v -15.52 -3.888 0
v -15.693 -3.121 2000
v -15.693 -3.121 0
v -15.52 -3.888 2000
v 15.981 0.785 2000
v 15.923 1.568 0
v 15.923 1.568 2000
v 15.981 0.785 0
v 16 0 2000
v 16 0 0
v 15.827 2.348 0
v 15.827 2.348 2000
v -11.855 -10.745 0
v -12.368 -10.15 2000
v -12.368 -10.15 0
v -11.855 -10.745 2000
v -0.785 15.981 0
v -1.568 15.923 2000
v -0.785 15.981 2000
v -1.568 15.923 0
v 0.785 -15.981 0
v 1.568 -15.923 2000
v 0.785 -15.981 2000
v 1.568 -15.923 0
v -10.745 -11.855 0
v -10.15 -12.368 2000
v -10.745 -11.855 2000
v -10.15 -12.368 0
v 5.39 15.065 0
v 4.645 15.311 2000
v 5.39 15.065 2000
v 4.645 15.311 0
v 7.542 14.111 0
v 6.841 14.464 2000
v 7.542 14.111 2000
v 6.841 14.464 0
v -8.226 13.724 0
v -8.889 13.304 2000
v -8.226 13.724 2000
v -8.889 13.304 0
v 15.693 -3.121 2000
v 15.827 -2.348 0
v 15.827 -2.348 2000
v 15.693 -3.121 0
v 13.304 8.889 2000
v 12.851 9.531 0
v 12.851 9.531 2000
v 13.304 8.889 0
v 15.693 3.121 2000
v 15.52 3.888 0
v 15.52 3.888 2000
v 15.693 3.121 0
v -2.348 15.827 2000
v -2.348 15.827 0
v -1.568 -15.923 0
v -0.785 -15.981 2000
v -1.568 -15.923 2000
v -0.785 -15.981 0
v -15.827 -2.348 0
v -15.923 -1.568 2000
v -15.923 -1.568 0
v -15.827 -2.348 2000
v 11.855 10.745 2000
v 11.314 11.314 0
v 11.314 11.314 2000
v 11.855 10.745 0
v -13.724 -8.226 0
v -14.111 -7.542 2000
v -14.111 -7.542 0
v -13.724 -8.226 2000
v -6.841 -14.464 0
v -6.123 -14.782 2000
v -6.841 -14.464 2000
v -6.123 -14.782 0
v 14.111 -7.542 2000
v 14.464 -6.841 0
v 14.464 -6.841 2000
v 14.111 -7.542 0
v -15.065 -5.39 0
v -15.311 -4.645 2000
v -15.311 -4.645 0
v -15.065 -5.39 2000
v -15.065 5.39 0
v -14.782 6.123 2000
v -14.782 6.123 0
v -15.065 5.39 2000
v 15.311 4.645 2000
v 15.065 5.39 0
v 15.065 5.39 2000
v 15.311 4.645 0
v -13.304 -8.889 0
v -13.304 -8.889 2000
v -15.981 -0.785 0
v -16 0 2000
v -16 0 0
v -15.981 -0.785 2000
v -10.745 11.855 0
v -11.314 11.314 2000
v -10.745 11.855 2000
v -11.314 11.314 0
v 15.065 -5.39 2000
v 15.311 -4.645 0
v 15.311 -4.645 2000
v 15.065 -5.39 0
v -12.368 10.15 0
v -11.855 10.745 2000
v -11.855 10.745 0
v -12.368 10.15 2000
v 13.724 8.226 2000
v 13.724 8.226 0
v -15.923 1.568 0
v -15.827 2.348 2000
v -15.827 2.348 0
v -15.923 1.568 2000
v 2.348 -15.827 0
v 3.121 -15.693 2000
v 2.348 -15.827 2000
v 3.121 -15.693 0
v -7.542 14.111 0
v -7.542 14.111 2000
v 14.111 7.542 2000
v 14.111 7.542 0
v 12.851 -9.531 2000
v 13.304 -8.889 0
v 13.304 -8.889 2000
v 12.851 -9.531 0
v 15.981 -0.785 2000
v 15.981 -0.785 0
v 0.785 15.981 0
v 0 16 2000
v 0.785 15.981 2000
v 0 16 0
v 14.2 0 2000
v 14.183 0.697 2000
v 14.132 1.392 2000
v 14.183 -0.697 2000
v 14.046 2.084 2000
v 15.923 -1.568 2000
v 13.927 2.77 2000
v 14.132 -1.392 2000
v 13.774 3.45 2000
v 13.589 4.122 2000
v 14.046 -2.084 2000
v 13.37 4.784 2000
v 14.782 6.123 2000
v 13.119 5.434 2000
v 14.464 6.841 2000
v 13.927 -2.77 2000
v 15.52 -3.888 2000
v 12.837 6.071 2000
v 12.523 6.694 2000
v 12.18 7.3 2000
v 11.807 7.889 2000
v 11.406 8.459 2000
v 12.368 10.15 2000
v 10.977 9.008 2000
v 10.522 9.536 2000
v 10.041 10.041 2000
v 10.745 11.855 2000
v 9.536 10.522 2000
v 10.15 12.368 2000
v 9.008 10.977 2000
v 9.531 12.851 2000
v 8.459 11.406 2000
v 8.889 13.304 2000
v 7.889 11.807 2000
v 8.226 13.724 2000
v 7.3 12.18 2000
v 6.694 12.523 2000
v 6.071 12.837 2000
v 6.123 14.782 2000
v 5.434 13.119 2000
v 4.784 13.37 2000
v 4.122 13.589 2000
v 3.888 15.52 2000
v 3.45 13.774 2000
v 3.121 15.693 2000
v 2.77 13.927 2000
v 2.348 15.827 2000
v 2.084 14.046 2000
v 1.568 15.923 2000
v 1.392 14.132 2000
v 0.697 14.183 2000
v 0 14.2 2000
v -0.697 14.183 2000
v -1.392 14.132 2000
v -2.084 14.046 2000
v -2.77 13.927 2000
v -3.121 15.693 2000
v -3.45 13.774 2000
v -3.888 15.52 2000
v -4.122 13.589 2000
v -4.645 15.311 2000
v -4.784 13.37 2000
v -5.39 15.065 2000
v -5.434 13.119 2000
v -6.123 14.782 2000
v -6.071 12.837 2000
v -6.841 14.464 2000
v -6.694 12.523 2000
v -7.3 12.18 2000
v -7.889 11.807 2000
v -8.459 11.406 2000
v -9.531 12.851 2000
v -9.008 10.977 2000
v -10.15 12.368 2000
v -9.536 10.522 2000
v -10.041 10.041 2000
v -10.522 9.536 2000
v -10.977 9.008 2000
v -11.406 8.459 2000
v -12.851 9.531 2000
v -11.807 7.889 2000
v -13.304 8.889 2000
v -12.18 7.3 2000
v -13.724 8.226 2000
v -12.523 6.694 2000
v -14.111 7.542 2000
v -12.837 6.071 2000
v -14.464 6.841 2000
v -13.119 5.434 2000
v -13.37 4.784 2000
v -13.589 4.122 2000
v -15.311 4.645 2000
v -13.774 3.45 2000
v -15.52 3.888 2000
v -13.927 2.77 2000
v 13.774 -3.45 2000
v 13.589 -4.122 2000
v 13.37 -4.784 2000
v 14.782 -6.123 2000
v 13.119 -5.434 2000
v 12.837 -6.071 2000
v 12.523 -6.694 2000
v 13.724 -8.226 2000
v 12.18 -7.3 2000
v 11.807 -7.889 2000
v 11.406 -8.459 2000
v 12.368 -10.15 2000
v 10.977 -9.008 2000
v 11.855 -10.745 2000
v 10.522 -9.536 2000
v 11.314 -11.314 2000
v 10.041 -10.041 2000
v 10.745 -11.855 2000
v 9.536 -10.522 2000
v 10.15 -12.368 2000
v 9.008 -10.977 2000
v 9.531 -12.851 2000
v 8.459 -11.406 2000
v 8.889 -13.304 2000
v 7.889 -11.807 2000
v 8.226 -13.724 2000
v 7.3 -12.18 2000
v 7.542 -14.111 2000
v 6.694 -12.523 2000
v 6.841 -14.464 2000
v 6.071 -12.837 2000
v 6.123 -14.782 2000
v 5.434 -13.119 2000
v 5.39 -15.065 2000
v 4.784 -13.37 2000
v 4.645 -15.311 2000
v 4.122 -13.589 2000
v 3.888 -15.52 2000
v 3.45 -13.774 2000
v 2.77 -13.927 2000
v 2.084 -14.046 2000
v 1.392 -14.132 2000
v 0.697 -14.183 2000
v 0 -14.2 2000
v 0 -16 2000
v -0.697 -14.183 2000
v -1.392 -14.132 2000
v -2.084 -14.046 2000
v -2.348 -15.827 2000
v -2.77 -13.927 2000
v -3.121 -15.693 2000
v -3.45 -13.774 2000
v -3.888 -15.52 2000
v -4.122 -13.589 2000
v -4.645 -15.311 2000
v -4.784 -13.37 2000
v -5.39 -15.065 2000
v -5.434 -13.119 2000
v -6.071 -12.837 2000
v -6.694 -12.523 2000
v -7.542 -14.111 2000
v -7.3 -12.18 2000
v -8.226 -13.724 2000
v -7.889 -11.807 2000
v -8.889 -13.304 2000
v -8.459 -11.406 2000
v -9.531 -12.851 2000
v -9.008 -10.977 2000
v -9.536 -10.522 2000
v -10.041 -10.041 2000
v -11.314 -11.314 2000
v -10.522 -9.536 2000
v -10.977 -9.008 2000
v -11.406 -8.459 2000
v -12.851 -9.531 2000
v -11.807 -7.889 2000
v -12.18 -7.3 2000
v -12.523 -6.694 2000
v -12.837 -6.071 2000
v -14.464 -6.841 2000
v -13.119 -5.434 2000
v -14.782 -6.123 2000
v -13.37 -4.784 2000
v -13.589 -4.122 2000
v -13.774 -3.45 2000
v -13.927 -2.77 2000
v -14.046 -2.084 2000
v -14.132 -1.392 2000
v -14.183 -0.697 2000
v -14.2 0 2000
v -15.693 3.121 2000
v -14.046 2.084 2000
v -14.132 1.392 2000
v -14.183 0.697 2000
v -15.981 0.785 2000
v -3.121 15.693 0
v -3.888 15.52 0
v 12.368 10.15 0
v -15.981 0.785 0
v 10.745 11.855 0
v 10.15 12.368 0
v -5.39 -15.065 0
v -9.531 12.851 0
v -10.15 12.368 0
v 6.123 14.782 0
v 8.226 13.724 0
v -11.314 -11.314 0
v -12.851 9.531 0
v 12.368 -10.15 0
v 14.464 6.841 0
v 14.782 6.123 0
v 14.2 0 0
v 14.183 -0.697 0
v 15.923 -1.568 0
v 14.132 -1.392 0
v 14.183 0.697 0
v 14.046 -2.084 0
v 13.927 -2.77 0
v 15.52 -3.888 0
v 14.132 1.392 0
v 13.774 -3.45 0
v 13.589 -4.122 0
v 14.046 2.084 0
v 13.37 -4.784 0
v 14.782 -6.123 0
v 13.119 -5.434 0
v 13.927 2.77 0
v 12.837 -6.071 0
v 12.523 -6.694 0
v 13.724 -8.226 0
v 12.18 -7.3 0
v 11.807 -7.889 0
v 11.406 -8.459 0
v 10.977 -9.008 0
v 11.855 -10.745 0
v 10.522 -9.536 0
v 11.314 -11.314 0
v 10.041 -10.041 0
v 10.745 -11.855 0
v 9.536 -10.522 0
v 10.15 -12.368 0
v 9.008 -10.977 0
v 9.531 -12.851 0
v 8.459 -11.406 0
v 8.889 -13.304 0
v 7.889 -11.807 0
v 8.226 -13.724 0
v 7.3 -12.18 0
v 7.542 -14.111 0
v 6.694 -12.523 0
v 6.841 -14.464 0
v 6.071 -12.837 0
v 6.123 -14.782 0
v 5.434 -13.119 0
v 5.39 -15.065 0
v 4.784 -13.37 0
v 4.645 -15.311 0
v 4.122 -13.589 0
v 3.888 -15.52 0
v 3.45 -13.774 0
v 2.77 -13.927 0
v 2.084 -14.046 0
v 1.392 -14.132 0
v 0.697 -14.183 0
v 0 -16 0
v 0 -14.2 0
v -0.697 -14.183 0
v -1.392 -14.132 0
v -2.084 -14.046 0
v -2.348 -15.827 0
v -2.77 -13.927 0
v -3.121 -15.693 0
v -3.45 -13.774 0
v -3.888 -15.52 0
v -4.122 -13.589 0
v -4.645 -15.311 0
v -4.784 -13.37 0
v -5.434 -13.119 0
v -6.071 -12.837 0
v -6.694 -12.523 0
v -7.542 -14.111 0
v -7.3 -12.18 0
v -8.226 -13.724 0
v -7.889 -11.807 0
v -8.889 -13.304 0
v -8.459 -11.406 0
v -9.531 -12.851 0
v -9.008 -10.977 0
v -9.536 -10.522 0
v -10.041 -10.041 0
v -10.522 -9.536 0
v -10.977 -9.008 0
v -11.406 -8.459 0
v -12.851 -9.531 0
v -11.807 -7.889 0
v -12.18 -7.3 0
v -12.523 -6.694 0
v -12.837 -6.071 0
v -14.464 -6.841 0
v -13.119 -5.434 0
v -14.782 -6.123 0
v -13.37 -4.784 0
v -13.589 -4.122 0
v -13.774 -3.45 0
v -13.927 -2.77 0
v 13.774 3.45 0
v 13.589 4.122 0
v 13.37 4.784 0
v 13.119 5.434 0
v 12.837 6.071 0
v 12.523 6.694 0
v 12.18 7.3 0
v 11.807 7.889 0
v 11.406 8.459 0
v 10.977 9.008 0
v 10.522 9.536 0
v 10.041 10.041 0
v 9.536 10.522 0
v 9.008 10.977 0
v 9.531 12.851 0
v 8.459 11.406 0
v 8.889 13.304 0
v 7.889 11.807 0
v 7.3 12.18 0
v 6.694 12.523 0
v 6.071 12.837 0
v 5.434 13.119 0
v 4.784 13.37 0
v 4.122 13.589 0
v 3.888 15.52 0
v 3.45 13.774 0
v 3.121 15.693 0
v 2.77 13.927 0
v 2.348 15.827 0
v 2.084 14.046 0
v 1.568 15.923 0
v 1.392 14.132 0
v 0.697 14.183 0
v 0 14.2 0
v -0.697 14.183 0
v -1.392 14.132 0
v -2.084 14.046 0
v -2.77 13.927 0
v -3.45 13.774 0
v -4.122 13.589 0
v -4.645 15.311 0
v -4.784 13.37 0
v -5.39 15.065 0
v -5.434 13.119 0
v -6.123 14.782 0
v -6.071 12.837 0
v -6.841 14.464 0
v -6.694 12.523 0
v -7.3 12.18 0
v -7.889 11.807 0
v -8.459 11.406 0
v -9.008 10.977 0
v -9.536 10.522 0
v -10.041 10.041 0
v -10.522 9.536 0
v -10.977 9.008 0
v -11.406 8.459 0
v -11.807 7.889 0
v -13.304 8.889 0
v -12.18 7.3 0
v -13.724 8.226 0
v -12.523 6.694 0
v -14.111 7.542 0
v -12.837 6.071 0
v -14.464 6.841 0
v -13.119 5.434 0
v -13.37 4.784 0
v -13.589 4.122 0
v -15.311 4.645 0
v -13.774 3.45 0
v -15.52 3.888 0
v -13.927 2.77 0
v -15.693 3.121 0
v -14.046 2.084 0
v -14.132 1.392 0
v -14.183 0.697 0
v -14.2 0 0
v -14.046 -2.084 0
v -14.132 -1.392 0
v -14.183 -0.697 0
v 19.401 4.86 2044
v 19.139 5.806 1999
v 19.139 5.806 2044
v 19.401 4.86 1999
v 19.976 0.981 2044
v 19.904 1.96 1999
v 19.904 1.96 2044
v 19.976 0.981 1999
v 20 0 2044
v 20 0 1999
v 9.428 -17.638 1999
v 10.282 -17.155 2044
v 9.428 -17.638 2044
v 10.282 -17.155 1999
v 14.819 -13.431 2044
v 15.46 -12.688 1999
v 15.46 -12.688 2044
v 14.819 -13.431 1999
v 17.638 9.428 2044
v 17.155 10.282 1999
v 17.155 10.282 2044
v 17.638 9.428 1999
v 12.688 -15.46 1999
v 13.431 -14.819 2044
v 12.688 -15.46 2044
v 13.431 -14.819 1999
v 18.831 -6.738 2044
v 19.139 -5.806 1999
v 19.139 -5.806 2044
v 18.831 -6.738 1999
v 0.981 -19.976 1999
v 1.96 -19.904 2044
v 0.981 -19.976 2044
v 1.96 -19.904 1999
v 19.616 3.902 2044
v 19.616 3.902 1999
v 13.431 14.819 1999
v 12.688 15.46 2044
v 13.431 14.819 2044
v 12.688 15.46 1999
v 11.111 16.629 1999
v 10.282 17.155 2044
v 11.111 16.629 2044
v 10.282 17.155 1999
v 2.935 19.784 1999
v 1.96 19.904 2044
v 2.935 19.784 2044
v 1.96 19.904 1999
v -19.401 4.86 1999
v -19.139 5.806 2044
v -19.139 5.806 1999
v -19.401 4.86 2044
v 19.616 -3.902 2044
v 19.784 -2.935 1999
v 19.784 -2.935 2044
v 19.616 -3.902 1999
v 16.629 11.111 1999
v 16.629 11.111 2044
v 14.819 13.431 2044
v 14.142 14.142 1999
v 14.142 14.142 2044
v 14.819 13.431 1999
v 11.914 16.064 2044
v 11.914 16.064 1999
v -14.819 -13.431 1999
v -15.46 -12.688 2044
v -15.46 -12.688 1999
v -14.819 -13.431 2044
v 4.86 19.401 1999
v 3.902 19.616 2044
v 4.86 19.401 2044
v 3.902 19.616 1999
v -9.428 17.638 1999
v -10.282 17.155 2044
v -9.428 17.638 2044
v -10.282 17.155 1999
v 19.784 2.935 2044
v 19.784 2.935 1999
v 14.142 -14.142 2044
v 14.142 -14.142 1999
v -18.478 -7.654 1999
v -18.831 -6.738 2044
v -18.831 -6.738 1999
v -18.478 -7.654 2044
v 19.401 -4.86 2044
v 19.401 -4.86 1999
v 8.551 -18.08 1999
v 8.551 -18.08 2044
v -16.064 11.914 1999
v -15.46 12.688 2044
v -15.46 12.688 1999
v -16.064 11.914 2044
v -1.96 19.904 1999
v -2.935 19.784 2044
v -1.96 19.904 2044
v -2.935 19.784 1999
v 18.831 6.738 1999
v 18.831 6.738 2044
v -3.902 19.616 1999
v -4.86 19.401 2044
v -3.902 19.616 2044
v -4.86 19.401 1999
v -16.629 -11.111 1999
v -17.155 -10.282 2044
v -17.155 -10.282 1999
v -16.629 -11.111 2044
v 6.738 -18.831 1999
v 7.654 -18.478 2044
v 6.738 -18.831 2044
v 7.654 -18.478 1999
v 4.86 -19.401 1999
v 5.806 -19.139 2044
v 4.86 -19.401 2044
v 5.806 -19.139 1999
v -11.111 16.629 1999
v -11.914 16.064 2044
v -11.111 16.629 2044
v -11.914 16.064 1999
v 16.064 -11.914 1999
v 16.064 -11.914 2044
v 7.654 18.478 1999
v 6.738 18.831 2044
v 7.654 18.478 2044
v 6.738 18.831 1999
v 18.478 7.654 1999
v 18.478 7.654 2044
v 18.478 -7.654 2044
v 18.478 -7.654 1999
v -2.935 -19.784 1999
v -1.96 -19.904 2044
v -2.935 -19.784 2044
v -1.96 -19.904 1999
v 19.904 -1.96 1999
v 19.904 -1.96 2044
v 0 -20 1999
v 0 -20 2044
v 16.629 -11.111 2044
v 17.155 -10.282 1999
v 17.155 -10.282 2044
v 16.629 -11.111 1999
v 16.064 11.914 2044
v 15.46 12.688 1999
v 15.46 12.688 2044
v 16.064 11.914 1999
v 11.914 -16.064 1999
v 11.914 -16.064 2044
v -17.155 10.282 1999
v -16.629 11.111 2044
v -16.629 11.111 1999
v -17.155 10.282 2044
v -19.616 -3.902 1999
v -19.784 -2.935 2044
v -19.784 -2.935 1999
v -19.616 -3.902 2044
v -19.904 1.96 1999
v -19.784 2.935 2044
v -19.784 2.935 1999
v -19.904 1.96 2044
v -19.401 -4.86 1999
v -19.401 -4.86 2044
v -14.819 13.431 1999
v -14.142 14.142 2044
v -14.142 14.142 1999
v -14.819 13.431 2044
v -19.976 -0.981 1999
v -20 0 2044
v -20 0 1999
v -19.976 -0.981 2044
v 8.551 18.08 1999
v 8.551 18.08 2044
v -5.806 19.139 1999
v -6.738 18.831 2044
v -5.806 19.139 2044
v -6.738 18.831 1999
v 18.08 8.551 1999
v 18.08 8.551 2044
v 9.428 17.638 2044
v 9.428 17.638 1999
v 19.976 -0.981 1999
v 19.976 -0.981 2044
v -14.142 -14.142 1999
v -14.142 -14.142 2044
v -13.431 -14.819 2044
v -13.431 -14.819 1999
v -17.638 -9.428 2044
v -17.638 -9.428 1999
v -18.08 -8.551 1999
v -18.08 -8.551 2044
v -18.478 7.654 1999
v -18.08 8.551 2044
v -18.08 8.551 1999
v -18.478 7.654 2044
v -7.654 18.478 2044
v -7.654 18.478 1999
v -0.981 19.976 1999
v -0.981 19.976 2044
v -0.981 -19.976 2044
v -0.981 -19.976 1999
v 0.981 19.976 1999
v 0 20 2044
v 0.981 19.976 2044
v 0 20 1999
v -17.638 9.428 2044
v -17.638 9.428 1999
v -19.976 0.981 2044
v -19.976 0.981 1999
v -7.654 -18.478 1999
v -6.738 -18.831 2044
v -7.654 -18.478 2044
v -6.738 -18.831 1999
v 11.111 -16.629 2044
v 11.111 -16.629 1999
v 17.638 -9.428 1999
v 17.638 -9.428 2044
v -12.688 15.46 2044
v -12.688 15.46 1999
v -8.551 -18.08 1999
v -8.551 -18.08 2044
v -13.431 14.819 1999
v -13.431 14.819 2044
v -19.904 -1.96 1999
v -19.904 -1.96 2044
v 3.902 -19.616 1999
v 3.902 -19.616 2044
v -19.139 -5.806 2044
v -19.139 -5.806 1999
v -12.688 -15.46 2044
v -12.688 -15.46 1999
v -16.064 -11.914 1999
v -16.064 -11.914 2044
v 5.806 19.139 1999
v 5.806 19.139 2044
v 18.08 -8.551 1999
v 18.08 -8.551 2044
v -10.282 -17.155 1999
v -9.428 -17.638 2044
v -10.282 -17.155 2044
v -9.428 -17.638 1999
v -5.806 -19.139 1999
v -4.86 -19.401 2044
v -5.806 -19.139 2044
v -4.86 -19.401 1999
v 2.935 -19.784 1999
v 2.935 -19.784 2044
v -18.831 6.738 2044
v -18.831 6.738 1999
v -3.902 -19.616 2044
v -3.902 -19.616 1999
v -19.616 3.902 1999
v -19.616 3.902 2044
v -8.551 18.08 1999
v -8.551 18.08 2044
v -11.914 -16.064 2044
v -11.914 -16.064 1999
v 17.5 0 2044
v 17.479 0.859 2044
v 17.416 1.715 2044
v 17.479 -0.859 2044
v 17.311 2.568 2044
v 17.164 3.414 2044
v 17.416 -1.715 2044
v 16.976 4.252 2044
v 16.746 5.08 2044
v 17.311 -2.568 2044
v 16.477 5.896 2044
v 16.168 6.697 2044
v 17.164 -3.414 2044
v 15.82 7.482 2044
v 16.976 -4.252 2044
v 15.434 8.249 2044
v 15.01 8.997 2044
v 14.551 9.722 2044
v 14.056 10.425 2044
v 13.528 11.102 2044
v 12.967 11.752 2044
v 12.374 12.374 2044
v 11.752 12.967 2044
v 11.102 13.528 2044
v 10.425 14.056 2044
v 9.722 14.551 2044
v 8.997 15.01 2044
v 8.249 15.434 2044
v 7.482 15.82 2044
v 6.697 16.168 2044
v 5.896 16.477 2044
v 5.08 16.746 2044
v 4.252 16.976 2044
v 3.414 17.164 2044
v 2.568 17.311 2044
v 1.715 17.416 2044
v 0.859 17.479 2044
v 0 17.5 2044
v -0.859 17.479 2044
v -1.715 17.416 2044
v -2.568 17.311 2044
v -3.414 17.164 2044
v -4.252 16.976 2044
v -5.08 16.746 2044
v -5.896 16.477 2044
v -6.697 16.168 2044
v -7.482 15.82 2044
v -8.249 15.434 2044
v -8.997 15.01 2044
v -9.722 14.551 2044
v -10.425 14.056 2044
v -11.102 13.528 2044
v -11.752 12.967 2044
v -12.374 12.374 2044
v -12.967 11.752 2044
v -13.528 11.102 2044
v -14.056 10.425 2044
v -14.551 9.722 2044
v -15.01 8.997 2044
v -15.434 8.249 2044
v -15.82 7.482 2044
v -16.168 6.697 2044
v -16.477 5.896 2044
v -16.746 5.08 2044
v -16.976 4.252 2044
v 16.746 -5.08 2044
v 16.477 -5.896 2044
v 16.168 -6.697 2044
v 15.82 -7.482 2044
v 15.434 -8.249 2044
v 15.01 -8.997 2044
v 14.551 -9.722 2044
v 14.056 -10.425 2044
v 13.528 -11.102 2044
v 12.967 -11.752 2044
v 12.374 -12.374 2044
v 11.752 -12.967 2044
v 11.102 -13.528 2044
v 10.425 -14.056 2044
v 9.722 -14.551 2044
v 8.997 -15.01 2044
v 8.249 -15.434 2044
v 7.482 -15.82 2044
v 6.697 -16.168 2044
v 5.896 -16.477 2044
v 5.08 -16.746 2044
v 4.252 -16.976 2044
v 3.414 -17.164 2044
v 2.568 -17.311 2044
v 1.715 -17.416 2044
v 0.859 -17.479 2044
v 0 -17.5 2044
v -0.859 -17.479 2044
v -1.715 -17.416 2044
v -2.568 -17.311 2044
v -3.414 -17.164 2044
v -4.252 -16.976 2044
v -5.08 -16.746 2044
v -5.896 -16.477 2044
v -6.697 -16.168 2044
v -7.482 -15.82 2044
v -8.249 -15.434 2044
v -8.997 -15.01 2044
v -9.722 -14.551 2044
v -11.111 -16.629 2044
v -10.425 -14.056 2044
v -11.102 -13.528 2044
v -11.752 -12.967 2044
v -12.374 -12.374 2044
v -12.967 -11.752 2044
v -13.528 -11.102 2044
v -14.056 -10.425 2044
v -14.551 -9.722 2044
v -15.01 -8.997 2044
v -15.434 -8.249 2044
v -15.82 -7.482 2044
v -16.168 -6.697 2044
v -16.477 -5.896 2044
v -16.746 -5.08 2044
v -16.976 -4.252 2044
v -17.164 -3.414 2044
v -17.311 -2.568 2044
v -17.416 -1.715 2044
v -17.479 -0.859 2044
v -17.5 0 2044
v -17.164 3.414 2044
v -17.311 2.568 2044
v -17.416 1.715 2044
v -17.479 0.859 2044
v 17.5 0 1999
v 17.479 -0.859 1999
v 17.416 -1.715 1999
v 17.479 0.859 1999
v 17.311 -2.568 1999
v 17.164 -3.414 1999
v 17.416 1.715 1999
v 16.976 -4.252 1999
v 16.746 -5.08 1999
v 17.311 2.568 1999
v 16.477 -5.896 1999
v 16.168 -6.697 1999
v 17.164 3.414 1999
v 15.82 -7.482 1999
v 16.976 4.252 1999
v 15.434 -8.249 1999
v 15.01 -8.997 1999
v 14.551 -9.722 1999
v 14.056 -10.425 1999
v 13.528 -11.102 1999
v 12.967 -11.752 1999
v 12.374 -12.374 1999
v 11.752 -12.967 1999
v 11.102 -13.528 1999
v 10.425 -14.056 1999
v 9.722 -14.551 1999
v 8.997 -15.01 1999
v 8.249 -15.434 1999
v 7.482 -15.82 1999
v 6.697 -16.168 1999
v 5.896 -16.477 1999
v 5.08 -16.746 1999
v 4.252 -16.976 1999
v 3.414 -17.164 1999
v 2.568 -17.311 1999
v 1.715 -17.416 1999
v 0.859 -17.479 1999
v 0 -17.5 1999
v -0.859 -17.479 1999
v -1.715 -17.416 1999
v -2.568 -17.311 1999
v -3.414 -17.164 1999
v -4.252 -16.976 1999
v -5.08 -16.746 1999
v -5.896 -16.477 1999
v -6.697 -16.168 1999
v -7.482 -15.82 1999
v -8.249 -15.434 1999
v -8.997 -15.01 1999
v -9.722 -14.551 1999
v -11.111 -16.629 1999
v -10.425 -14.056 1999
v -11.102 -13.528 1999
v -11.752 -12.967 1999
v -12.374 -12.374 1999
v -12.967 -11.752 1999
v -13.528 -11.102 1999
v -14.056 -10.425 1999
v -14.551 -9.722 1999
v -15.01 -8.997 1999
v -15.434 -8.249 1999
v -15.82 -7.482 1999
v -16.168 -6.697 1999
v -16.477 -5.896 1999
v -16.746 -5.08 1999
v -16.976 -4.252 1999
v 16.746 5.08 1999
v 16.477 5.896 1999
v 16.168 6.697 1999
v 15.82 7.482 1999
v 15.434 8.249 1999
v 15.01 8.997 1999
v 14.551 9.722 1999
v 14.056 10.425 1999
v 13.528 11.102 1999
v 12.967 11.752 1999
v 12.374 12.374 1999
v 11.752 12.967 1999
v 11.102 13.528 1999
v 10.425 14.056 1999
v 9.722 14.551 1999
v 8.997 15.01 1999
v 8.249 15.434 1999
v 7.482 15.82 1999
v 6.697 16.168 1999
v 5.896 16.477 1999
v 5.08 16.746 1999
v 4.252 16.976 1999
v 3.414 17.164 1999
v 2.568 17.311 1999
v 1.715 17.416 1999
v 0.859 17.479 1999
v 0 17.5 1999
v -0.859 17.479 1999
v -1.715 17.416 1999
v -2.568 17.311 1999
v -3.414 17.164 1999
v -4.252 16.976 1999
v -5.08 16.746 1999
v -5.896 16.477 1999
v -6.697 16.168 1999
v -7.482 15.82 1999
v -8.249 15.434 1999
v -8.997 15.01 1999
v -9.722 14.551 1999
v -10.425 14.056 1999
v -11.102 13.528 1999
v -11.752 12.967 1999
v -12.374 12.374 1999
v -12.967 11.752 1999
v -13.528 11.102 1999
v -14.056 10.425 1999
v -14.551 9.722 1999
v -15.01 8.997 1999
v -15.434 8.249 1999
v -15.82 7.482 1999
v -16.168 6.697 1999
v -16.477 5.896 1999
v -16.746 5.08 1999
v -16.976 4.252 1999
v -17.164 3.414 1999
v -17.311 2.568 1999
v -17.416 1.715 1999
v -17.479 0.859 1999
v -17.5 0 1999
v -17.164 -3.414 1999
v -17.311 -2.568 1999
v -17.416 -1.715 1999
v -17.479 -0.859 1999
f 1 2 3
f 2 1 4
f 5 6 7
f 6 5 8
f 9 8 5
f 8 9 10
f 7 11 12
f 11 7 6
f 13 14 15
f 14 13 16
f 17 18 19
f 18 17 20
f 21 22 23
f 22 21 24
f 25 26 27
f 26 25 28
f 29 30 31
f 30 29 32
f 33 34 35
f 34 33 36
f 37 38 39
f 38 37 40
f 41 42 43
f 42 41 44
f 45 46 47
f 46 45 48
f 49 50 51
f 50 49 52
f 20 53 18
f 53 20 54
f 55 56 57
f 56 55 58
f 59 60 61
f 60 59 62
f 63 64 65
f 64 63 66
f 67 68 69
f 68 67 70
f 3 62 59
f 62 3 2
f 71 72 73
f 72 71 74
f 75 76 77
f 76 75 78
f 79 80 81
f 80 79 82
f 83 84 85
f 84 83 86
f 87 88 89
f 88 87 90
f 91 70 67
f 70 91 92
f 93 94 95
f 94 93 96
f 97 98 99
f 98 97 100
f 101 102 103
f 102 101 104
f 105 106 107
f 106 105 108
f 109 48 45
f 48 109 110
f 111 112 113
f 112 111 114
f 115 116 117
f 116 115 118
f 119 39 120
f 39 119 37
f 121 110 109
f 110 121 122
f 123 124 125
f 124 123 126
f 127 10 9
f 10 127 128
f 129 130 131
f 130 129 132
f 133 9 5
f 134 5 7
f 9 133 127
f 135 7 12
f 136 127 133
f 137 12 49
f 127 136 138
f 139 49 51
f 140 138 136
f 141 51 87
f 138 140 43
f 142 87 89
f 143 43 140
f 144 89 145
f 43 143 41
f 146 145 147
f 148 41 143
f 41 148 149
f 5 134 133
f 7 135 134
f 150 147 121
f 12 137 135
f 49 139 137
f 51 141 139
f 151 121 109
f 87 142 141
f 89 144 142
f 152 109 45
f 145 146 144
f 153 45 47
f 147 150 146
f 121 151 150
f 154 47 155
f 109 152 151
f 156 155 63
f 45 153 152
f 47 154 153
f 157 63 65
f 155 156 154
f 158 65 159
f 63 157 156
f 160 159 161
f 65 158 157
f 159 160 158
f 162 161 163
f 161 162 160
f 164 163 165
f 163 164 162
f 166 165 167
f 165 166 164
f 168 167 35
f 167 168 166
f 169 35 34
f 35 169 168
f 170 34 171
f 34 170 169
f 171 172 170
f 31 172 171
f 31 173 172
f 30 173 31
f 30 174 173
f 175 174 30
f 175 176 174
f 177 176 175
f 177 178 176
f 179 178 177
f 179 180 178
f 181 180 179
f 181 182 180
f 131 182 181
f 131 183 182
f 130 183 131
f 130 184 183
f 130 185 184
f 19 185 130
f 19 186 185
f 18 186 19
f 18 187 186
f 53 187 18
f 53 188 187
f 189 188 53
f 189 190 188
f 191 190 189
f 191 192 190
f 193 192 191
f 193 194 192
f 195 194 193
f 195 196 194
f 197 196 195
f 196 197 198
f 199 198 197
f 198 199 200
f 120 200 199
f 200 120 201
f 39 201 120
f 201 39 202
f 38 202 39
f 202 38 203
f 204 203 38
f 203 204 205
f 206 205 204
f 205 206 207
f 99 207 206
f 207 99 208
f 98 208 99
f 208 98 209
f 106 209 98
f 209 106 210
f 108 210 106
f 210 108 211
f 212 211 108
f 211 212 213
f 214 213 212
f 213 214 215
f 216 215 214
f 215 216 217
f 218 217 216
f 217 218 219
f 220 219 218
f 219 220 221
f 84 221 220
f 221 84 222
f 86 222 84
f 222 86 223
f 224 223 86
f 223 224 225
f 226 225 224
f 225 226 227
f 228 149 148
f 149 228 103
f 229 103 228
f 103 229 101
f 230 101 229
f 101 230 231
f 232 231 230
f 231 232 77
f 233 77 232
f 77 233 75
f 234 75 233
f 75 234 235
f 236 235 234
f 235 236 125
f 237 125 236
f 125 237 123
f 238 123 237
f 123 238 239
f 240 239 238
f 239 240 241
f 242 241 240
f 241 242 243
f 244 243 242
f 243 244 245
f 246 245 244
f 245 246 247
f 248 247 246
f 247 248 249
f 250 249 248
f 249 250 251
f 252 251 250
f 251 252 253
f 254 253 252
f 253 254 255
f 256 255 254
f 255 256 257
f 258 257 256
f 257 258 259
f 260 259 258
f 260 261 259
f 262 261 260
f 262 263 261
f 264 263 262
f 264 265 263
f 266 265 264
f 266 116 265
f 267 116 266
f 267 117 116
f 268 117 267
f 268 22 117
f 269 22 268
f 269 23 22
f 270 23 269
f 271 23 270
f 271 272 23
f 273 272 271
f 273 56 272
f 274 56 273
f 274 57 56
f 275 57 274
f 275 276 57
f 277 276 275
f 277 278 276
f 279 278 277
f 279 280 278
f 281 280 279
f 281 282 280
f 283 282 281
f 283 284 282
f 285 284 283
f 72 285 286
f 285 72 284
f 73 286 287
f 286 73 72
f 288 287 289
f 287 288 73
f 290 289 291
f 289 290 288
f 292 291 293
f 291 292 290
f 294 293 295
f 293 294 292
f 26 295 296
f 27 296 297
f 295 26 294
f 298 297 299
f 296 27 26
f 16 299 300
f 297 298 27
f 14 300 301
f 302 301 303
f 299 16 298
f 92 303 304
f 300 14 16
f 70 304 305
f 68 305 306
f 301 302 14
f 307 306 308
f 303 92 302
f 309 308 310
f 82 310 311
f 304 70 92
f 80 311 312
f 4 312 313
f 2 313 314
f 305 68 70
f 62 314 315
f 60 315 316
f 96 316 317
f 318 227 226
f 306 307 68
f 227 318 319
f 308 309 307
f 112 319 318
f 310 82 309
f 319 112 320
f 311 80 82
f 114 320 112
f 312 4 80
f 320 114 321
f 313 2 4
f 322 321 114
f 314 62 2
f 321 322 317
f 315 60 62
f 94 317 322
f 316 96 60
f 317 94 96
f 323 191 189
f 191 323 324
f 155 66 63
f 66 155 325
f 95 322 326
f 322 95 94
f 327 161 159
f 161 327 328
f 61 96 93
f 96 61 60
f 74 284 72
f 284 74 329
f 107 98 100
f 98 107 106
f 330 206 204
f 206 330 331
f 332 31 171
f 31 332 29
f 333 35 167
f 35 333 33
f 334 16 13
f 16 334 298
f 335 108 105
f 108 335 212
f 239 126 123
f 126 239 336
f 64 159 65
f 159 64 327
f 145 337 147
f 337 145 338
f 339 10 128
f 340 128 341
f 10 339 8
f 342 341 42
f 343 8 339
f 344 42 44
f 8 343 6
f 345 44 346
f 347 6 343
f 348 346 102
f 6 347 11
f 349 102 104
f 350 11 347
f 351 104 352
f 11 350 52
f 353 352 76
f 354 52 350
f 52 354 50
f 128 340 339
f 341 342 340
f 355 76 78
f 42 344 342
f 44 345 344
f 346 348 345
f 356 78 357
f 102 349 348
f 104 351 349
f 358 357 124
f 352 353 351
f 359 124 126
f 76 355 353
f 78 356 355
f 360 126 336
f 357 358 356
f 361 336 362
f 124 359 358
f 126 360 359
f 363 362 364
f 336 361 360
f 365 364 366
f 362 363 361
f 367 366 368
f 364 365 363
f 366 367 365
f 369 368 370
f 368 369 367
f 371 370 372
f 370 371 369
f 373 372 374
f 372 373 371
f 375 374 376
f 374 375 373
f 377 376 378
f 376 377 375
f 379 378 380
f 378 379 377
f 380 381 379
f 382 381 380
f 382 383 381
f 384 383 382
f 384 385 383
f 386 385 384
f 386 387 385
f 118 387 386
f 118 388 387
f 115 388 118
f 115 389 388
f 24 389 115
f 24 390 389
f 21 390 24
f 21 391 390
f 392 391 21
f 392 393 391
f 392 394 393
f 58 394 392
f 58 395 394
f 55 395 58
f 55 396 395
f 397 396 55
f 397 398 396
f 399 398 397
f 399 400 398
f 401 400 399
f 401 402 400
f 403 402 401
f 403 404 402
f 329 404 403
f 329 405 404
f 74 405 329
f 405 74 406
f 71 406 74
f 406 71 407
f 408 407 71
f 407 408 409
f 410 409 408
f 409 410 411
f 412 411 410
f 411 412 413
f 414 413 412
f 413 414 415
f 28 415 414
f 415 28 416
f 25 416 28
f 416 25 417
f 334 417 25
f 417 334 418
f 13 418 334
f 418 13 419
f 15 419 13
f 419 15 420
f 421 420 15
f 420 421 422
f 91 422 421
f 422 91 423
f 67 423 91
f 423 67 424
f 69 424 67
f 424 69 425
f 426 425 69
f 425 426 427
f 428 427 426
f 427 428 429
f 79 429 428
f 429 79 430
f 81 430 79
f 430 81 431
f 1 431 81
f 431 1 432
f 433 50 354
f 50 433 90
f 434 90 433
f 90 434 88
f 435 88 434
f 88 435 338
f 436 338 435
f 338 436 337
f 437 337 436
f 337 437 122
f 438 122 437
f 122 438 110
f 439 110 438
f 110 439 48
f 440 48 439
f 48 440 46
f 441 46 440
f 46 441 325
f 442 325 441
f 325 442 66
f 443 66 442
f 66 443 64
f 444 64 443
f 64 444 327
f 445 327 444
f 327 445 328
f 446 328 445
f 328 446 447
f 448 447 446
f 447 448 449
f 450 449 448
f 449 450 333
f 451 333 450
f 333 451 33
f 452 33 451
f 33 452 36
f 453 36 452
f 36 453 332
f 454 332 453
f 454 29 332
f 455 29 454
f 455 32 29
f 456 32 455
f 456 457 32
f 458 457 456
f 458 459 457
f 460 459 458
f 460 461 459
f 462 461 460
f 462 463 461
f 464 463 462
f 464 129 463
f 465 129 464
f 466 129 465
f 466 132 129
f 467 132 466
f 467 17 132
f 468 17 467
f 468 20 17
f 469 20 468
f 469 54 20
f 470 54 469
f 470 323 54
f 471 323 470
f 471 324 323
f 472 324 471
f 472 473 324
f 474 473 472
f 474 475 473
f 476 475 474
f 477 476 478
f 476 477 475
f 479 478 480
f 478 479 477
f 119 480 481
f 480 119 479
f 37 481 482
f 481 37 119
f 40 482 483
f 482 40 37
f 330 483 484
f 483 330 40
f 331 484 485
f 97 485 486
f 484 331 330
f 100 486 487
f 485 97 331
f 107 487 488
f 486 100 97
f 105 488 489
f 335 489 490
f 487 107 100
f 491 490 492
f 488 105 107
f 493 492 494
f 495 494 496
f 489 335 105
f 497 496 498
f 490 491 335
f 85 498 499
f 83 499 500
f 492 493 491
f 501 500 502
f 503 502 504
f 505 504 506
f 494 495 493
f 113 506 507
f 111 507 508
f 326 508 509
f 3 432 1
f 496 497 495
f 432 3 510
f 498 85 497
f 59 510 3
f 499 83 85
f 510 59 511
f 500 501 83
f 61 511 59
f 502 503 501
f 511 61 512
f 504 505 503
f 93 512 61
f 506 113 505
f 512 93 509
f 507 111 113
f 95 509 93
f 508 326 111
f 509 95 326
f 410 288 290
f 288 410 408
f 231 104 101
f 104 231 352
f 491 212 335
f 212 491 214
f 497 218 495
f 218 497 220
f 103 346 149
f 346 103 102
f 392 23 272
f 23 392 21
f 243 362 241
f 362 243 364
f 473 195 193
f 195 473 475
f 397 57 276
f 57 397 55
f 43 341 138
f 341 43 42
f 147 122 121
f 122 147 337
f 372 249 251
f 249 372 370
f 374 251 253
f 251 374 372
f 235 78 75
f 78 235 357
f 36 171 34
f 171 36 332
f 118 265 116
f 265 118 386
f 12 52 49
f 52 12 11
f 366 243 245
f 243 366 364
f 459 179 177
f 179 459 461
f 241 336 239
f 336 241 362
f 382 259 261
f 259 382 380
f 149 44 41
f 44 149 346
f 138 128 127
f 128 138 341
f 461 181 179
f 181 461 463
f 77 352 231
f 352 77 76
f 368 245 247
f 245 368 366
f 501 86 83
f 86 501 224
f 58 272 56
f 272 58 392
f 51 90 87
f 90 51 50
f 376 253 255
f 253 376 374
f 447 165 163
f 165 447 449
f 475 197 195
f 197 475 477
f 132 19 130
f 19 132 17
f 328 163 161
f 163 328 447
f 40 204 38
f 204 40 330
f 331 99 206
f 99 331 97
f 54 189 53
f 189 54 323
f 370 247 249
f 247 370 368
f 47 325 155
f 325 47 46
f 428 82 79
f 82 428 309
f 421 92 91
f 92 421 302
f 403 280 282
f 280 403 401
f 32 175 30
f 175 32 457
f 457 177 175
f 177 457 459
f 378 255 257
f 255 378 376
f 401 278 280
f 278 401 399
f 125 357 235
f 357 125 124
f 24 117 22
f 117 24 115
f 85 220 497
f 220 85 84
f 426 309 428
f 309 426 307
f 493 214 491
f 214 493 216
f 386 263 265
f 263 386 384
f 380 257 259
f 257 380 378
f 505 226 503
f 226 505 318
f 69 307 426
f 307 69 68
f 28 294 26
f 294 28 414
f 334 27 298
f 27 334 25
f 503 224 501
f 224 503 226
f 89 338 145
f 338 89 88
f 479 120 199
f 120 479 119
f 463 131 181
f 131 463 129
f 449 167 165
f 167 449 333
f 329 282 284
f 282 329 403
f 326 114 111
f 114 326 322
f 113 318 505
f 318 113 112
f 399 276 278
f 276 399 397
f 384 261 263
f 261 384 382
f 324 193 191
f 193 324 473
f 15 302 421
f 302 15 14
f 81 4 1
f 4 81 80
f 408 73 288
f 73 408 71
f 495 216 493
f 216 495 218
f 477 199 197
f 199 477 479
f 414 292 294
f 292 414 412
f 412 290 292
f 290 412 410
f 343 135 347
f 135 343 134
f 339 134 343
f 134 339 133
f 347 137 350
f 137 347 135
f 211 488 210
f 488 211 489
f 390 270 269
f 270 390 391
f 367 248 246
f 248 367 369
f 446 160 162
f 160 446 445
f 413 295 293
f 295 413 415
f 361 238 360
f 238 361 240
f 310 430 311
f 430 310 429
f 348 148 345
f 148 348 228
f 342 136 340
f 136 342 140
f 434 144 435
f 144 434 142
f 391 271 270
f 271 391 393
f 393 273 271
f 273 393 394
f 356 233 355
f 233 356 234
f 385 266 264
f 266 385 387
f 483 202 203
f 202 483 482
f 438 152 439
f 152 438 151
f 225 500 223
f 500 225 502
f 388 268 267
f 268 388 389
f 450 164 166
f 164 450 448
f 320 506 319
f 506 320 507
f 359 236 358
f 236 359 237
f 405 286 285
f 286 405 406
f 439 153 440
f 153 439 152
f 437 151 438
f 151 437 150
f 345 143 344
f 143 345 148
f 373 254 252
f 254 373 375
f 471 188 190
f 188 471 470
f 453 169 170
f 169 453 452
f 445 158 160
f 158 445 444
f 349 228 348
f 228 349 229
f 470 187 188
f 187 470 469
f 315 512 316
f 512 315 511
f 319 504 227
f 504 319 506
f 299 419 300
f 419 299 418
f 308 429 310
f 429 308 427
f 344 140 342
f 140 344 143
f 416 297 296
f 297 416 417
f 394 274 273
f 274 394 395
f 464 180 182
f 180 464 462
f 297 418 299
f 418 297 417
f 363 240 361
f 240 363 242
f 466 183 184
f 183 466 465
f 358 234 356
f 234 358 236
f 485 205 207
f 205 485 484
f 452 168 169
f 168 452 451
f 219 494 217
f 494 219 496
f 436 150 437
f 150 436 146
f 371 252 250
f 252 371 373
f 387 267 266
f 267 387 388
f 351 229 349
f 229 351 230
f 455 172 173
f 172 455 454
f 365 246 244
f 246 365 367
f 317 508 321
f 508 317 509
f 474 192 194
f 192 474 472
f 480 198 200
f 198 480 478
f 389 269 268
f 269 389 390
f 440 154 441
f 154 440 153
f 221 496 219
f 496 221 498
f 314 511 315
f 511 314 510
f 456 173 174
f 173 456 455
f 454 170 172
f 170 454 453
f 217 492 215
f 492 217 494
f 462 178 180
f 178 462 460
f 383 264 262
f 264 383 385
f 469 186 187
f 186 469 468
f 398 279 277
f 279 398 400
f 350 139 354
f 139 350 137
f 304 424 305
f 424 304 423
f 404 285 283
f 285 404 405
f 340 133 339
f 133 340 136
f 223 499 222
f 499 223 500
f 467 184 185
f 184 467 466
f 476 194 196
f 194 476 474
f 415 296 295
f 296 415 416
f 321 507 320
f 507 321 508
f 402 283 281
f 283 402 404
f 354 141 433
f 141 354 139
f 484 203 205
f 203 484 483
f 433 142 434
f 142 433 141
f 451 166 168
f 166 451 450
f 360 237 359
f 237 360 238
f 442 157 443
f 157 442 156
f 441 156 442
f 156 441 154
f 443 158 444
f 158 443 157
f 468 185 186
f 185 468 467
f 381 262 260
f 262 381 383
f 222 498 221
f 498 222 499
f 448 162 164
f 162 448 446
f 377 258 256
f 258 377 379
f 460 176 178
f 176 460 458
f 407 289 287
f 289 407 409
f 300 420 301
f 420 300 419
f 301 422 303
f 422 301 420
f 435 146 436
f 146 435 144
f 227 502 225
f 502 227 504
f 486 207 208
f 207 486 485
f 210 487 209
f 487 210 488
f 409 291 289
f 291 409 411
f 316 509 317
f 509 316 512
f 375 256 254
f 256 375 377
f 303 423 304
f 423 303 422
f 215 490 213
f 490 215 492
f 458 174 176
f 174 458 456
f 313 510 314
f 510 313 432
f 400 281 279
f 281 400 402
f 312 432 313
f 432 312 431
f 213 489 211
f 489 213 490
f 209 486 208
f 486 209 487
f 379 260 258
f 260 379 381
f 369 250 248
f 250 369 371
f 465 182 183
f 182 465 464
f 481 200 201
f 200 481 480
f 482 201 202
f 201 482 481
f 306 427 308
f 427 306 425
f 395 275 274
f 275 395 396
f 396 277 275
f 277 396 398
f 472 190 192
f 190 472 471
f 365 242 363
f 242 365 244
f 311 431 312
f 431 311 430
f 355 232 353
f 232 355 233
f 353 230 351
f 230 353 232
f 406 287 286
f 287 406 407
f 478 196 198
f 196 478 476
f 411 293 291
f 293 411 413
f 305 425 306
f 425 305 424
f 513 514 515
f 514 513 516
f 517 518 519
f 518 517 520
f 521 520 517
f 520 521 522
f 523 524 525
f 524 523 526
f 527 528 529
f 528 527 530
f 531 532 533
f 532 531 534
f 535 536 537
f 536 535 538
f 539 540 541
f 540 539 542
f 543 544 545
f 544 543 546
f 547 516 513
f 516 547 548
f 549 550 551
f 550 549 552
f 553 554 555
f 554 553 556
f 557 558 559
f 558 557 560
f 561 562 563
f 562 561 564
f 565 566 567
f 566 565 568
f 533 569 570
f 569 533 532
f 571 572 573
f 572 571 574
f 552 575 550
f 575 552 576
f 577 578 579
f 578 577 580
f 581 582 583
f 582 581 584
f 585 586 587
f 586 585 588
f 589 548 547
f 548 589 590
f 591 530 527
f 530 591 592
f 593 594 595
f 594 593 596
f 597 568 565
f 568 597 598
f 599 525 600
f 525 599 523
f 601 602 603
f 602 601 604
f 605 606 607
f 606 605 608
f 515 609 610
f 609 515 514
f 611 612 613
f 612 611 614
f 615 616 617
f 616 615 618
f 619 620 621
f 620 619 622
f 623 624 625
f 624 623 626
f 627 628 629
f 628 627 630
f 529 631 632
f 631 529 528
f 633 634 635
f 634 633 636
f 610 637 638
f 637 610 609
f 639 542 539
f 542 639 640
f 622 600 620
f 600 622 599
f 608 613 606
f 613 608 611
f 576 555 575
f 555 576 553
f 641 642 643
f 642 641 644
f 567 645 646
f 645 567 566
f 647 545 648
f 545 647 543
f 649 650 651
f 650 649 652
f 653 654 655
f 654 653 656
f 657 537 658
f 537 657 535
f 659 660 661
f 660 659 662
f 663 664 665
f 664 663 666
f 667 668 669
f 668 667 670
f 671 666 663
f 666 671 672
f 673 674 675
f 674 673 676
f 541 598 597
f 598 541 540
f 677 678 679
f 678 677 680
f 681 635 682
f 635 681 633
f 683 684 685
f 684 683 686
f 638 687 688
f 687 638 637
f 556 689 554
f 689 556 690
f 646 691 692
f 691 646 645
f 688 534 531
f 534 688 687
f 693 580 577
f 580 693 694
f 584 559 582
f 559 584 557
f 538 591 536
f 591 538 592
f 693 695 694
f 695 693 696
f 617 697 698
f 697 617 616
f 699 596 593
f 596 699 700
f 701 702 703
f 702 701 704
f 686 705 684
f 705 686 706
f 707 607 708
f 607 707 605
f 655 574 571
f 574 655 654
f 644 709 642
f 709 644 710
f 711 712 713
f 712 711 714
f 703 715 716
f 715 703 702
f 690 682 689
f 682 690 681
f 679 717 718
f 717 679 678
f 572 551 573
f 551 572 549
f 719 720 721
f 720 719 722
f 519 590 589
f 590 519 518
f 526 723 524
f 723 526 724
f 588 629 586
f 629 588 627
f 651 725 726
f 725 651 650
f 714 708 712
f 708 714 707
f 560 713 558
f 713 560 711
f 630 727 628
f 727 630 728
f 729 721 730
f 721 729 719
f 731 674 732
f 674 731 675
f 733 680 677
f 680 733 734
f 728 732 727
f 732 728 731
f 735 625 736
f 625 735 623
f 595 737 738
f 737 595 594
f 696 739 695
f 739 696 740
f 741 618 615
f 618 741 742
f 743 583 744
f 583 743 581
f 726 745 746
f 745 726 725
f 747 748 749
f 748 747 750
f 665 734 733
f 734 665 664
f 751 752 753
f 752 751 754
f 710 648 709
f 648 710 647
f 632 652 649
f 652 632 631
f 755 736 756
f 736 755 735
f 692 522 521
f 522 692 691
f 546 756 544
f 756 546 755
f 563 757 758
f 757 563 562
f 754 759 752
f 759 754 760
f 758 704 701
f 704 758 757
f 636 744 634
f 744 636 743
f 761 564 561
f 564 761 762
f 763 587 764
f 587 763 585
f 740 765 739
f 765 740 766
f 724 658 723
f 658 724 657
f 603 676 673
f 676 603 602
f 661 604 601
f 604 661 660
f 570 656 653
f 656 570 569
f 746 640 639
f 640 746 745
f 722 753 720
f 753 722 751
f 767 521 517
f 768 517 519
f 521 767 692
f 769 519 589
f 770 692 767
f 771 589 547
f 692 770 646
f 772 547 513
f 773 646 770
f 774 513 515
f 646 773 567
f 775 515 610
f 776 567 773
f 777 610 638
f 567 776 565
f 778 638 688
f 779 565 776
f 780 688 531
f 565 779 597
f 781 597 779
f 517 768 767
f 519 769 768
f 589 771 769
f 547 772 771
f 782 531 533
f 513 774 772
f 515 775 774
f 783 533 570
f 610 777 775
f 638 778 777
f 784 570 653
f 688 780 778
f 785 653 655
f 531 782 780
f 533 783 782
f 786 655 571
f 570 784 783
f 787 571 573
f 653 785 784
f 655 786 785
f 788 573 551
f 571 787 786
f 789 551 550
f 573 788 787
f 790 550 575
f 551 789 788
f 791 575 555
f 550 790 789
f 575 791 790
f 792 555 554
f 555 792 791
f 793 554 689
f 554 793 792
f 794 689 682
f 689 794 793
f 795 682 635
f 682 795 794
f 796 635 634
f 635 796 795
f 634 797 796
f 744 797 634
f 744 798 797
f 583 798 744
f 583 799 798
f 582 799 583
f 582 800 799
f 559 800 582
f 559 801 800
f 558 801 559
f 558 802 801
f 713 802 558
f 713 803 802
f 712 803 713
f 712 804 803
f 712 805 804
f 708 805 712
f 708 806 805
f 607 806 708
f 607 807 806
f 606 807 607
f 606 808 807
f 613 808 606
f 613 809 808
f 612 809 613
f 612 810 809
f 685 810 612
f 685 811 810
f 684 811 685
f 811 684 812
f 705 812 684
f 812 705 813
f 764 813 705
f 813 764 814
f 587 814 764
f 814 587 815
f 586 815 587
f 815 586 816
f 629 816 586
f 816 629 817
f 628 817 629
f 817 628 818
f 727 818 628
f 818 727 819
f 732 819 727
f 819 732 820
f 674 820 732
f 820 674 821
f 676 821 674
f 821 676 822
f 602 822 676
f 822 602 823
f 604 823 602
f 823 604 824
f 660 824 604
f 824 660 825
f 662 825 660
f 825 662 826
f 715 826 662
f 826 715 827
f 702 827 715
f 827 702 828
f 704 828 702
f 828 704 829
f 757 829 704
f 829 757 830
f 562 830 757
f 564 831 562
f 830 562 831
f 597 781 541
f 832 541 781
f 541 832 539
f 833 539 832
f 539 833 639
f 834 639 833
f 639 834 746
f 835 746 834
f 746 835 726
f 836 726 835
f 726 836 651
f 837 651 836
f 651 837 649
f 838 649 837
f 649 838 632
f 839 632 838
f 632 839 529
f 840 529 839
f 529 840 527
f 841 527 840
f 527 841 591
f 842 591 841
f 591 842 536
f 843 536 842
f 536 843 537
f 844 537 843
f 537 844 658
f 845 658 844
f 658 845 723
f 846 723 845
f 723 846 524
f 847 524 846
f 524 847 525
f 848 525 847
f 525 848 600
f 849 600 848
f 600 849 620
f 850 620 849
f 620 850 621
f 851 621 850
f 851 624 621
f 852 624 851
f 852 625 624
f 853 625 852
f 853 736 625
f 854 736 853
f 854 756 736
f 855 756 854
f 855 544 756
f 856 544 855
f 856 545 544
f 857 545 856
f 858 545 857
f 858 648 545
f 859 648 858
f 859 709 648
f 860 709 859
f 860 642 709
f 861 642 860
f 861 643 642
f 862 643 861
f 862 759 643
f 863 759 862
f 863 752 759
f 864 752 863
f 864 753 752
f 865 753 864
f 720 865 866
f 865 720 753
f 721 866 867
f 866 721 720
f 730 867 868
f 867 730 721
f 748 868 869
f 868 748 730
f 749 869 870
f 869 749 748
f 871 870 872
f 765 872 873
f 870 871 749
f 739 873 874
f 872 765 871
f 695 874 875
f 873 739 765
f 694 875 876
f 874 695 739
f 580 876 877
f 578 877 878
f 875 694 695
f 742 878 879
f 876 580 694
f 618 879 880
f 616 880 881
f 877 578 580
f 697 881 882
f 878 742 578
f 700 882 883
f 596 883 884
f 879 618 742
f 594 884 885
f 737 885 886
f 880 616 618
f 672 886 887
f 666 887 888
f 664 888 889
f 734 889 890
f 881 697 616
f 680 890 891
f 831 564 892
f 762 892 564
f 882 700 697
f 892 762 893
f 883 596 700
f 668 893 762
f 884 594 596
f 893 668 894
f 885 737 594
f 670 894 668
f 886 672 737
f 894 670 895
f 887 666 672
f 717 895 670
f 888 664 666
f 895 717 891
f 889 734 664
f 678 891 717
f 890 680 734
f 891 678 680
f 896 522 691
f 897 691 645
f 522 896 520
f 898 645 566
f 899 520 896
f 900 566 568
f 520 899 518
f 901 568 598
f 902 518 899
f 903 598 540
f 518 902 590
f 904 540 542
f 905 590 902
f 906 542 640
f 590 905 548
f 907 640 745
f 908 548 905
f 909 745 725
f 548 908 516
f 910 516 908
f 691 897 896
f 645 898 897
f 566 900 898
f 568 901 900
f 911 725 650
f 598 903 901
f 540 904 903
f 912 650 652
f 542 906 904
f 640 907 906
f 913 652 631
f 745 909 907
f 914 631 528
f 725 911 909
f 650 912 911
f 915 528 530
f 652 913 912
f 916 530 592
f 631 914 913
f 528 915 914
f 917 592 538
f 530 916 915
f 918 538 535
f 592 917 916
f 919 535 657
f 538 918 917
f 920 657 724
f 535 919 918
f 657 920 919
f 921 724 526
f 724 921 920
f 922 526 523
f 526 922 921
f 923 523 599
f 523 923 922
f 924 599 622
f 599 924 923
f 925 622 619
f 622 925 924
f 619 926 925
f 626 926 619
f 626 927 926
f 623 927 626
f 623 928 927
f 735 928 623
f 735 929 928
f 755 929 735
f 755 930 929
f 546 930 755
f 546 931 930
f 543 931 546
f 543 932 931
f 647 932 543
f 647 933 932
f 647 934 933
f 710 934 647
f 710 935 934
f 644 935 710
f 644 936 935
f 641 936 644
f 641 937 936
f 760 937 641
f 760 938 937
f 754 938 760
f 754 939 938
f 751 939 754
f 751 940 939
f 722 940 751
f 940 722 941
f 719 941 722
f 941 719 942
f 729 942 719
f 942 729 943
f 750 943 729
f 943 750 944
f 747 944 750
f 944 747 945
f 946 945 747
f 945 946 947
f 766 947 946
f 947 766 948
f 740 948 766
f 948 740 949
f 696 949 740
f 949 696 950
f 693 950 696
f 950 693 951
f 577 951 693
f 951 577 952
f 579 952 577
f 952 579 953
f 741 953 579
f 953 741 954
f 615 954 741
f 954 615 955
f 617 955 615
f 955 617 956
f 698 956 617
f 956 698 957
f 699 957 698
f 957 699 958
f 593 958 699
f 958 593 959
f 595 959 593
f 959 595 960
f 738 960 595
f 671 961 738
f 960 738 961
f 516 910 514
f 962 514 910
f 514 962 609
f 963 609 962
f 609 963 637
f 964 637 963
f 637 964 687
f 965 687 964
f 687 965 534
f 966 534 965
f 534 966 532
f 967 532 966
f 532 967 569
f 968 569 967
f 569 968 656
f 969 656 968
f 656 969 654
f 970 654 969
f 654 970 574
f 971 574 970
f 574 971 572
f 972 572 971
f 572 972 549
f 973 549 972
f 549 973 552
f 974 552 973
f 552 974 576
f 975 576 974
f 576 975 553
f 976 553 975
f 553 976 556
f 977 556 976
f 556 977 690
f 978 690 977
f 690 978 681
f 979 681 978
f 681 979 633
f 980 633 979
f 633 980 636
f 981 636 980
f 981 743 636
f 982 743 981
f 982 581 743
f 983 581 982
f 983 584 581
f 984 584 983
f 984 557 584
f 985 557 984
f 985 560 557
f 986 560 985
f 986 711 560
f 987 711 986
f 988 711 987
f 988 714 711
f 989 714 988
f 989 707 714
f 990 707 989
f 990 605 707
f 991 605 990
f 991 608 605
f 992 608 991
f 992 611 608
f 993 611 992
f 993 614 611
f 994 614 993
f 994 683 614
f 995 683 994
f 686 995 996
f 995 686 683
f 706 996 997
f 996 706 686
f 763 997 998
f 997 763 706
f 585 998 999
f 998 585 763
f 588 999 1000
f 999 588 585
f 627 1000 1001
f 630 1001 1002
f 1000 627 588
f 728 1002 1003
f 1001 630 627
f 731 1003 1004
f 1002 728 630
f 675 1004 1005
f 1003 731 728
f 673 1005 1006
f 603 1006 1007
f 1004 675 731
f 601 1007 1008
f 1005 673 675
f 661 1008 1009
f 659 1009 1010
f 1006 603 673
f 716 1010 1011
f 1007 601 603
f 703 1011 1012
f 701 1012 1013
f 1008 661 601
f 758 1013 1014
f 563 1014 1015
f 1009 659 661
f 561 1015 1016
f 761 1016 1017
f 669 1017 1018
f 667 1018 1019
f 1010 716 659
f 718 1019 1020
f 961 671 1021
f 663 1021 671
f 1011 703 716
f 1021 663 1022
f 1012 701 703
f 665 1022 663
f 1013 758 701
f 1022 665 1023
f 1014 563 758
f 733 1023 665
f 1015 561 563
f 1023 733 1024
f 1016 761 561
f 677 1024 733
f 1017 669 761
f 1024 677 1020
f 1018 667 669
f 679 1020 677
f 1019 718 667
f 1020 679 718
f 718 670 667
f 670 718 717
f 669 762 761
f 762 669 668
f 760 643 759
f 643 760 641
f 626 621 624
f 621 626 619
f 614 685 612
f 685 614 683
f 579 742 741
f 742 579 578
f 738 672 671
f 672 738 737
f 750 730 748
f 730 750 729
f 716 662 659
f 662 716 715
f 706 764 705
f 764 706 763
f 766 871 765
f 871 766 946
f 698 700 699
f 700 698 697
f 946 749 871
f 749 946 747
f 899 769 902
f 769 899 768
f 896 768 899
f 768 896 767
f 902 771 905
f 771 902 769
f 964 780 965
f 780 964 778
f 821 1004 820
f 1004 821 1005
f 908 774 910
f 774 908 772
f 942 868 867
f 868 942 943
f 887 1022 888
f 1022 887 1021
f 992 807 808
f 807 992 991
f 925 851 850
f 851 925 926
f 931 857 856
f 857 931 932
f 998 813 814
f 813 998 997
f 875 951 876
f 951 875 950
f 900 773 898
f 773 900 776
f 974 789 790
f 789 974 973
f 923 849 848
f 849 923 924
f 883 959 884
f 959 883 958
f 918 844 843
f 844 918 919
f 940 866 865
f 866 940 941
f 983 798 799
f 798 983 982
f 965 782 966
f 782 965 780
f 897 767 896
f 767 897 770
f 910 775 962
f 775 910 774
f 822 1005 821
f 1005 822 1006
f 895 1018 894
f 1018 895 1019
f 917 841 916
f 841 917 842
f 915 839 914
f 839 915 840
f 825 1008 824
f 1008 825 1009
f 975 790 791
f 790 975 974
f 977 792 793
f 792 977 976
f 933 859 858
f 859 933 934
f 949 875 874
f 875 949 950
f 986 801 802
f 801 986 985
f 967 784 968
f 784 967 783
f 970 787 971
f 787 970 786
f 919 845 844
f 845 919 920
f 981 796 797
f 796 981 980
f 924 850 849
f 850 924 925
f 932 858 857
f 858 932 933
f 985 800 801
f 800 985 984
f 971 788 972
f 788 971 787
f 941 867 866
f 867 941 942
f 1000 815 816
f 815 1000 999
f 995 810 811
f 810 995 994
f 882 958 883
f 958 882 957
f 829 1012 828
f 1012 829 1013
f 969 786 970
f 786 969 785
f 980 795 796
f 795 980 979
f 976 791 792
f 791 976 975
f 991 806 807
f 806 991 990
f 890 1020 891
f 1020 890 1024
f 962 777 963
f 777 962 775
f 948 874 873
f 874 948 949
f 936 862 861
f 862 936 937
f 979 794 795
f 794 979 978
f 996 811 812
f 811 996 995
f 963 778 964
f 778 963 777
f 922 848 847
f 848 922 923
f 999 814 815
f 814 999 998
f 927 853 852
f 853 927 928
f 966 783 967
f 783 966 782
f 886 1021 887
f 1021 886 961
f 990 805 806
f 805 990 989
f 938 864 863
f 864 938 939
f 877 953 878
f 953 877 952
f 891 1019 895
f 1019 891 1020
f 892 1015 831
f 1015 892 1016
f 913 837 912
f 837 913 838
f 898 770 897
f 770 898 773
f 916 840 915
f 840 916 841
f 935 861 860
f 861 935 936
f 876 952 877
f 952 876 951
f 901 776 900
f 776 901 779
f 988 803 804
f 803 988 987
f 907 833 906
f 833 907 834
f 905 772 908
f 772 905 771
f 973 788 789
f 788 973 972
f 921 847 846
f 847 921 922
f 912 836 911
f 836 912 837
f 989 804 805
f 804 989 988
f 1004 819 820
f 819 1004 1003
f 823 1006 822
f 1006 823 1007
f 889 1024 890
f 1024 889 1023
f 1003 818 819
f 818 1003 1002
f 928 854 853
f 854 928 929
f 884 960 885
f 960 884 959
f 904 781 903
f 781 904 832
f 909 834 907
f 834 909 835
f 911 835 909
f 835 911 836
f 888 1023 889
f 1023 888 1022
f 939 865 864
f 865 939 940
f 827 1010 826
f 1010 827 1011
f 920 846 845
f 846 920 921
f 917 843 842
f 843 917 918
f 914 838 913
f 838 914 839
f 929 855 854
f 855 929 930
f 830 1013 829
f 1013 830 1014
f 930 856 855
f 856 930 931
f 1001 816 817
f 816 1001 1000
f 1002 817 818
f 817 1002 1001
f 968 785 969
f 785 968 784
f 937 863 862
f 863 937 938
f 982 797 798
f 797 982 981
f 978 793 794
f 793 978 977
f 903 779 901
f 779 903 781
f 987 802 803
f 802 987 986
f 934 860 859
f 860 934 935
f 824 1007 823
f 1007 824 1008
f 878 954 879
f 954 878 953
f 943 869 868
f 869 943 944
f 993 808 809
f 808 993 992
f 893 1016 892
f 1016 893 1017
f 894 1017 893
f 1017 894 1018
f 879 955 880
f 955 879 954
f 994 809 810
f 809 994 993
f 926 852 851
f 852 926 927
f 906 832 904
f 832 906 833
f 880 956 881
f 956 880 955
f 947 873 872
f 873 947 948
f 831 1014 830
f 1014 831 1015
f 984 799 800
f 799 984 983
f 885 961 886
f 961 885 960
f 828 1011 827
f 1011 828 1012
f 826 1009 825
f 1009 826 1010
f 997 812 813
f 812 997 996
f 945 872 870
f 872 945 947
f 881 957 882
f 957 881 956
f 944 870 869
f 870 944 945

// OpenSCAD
$fn = 128;

// Parameters
length_mm = 2000; //[1000:4000:10]
ht32_outer_diameter_mm = 32; //[16:64:1]
ht32_wall_thickness_mm = 1.8; //[0.9:3.6:0.1]
fitting_length_mm = 45; //[25:90:1]
fitting_outer_diameter_mm = 40; //[32:80:1]
fitting_wall_thickness_mm = 2.5; //[1.2:5:0.1]
fitting_stop_thickness_mm = 3; //[1:8:0.5]
fitting_stop_axial_pos_mm = 18; //[8:35:1]
overlap_mm = 1; //[0.5:2:0.1]

eps = 0.02;

module ht_pipe() {
    pipe_r_o = ht32_outer_diameter_mm/2;
    pipe_r_i = max(0.01, pipe_r_o - ht32_wall_thickness_mm);

    fit_r_o  = fitting_outer_diameter_mm/2;
    fit_r_i  = max(0.01, fit_r_o - fitting_wall_thickness_mm);

    // Clamp overlap so fitting always intersects pipe (one connected solid)
    ov = min(max(overlap_mm, 0.1), fitting_length_mm - 0.1);

    // Fitting starts before pipe end by ov, so it overlaps into pipe
    fit_z = length_mm - ov;

    // Stop ring: create an internal shoulder by reducing the inner radius locally
    stop_h = min(max(fitting_stop_thickness_mm, 0.1), fitting_length_mm - 0.1);
    stop_z0 = min(max(fitting_stop_axial_pos_mm, 0), fitting_length_mm - stop_h);

    // Inner radius at stop region (smaller than fit_r_i, but not smaller than pipe_r_i)
    // This leaves a shoulder that can stop the inserted pipe.
    stop_inner_r = max(pipe_r_i, fit_r_i - max(0.5, fitting_wall_thickness_mm*0.6));

    color([0.85, 0.85, 0.8])
    union() {
        // Pipe body (hollow)
        difference() {
            cylinder(h=length_mm, r=pipe_r_o, center=false);
            translate([0, 0, -eps])
                cylinder(h=length_mm + 2*eps, r=pipe_r_i, center=false);
        }

        // End fitting (hollow with internal stop shoulder)
        translate([0, 0, fit_z])
        difference() {
            cylinder(h=fitting_length_mm, r=fit_r_o, center=false);

            // Inner void of fitting (full length)
            translate([0, 0, -eps])
                cylinder(h=fitting_length_mm + 2*eps, r=fit_r_i, center=false);

            // Remove less material in stop region by subtracting only to stop_inner_r there
            // (i.e., leave a ring/shoulder between stop_inner_r and fit_r_i)
            translate([0, 0, stop_z0 - eps])
                cylinder(h=stop_h + 2*eps, r=stop_inner_r, center=false);
        }
    }
}

ht_pipe();
